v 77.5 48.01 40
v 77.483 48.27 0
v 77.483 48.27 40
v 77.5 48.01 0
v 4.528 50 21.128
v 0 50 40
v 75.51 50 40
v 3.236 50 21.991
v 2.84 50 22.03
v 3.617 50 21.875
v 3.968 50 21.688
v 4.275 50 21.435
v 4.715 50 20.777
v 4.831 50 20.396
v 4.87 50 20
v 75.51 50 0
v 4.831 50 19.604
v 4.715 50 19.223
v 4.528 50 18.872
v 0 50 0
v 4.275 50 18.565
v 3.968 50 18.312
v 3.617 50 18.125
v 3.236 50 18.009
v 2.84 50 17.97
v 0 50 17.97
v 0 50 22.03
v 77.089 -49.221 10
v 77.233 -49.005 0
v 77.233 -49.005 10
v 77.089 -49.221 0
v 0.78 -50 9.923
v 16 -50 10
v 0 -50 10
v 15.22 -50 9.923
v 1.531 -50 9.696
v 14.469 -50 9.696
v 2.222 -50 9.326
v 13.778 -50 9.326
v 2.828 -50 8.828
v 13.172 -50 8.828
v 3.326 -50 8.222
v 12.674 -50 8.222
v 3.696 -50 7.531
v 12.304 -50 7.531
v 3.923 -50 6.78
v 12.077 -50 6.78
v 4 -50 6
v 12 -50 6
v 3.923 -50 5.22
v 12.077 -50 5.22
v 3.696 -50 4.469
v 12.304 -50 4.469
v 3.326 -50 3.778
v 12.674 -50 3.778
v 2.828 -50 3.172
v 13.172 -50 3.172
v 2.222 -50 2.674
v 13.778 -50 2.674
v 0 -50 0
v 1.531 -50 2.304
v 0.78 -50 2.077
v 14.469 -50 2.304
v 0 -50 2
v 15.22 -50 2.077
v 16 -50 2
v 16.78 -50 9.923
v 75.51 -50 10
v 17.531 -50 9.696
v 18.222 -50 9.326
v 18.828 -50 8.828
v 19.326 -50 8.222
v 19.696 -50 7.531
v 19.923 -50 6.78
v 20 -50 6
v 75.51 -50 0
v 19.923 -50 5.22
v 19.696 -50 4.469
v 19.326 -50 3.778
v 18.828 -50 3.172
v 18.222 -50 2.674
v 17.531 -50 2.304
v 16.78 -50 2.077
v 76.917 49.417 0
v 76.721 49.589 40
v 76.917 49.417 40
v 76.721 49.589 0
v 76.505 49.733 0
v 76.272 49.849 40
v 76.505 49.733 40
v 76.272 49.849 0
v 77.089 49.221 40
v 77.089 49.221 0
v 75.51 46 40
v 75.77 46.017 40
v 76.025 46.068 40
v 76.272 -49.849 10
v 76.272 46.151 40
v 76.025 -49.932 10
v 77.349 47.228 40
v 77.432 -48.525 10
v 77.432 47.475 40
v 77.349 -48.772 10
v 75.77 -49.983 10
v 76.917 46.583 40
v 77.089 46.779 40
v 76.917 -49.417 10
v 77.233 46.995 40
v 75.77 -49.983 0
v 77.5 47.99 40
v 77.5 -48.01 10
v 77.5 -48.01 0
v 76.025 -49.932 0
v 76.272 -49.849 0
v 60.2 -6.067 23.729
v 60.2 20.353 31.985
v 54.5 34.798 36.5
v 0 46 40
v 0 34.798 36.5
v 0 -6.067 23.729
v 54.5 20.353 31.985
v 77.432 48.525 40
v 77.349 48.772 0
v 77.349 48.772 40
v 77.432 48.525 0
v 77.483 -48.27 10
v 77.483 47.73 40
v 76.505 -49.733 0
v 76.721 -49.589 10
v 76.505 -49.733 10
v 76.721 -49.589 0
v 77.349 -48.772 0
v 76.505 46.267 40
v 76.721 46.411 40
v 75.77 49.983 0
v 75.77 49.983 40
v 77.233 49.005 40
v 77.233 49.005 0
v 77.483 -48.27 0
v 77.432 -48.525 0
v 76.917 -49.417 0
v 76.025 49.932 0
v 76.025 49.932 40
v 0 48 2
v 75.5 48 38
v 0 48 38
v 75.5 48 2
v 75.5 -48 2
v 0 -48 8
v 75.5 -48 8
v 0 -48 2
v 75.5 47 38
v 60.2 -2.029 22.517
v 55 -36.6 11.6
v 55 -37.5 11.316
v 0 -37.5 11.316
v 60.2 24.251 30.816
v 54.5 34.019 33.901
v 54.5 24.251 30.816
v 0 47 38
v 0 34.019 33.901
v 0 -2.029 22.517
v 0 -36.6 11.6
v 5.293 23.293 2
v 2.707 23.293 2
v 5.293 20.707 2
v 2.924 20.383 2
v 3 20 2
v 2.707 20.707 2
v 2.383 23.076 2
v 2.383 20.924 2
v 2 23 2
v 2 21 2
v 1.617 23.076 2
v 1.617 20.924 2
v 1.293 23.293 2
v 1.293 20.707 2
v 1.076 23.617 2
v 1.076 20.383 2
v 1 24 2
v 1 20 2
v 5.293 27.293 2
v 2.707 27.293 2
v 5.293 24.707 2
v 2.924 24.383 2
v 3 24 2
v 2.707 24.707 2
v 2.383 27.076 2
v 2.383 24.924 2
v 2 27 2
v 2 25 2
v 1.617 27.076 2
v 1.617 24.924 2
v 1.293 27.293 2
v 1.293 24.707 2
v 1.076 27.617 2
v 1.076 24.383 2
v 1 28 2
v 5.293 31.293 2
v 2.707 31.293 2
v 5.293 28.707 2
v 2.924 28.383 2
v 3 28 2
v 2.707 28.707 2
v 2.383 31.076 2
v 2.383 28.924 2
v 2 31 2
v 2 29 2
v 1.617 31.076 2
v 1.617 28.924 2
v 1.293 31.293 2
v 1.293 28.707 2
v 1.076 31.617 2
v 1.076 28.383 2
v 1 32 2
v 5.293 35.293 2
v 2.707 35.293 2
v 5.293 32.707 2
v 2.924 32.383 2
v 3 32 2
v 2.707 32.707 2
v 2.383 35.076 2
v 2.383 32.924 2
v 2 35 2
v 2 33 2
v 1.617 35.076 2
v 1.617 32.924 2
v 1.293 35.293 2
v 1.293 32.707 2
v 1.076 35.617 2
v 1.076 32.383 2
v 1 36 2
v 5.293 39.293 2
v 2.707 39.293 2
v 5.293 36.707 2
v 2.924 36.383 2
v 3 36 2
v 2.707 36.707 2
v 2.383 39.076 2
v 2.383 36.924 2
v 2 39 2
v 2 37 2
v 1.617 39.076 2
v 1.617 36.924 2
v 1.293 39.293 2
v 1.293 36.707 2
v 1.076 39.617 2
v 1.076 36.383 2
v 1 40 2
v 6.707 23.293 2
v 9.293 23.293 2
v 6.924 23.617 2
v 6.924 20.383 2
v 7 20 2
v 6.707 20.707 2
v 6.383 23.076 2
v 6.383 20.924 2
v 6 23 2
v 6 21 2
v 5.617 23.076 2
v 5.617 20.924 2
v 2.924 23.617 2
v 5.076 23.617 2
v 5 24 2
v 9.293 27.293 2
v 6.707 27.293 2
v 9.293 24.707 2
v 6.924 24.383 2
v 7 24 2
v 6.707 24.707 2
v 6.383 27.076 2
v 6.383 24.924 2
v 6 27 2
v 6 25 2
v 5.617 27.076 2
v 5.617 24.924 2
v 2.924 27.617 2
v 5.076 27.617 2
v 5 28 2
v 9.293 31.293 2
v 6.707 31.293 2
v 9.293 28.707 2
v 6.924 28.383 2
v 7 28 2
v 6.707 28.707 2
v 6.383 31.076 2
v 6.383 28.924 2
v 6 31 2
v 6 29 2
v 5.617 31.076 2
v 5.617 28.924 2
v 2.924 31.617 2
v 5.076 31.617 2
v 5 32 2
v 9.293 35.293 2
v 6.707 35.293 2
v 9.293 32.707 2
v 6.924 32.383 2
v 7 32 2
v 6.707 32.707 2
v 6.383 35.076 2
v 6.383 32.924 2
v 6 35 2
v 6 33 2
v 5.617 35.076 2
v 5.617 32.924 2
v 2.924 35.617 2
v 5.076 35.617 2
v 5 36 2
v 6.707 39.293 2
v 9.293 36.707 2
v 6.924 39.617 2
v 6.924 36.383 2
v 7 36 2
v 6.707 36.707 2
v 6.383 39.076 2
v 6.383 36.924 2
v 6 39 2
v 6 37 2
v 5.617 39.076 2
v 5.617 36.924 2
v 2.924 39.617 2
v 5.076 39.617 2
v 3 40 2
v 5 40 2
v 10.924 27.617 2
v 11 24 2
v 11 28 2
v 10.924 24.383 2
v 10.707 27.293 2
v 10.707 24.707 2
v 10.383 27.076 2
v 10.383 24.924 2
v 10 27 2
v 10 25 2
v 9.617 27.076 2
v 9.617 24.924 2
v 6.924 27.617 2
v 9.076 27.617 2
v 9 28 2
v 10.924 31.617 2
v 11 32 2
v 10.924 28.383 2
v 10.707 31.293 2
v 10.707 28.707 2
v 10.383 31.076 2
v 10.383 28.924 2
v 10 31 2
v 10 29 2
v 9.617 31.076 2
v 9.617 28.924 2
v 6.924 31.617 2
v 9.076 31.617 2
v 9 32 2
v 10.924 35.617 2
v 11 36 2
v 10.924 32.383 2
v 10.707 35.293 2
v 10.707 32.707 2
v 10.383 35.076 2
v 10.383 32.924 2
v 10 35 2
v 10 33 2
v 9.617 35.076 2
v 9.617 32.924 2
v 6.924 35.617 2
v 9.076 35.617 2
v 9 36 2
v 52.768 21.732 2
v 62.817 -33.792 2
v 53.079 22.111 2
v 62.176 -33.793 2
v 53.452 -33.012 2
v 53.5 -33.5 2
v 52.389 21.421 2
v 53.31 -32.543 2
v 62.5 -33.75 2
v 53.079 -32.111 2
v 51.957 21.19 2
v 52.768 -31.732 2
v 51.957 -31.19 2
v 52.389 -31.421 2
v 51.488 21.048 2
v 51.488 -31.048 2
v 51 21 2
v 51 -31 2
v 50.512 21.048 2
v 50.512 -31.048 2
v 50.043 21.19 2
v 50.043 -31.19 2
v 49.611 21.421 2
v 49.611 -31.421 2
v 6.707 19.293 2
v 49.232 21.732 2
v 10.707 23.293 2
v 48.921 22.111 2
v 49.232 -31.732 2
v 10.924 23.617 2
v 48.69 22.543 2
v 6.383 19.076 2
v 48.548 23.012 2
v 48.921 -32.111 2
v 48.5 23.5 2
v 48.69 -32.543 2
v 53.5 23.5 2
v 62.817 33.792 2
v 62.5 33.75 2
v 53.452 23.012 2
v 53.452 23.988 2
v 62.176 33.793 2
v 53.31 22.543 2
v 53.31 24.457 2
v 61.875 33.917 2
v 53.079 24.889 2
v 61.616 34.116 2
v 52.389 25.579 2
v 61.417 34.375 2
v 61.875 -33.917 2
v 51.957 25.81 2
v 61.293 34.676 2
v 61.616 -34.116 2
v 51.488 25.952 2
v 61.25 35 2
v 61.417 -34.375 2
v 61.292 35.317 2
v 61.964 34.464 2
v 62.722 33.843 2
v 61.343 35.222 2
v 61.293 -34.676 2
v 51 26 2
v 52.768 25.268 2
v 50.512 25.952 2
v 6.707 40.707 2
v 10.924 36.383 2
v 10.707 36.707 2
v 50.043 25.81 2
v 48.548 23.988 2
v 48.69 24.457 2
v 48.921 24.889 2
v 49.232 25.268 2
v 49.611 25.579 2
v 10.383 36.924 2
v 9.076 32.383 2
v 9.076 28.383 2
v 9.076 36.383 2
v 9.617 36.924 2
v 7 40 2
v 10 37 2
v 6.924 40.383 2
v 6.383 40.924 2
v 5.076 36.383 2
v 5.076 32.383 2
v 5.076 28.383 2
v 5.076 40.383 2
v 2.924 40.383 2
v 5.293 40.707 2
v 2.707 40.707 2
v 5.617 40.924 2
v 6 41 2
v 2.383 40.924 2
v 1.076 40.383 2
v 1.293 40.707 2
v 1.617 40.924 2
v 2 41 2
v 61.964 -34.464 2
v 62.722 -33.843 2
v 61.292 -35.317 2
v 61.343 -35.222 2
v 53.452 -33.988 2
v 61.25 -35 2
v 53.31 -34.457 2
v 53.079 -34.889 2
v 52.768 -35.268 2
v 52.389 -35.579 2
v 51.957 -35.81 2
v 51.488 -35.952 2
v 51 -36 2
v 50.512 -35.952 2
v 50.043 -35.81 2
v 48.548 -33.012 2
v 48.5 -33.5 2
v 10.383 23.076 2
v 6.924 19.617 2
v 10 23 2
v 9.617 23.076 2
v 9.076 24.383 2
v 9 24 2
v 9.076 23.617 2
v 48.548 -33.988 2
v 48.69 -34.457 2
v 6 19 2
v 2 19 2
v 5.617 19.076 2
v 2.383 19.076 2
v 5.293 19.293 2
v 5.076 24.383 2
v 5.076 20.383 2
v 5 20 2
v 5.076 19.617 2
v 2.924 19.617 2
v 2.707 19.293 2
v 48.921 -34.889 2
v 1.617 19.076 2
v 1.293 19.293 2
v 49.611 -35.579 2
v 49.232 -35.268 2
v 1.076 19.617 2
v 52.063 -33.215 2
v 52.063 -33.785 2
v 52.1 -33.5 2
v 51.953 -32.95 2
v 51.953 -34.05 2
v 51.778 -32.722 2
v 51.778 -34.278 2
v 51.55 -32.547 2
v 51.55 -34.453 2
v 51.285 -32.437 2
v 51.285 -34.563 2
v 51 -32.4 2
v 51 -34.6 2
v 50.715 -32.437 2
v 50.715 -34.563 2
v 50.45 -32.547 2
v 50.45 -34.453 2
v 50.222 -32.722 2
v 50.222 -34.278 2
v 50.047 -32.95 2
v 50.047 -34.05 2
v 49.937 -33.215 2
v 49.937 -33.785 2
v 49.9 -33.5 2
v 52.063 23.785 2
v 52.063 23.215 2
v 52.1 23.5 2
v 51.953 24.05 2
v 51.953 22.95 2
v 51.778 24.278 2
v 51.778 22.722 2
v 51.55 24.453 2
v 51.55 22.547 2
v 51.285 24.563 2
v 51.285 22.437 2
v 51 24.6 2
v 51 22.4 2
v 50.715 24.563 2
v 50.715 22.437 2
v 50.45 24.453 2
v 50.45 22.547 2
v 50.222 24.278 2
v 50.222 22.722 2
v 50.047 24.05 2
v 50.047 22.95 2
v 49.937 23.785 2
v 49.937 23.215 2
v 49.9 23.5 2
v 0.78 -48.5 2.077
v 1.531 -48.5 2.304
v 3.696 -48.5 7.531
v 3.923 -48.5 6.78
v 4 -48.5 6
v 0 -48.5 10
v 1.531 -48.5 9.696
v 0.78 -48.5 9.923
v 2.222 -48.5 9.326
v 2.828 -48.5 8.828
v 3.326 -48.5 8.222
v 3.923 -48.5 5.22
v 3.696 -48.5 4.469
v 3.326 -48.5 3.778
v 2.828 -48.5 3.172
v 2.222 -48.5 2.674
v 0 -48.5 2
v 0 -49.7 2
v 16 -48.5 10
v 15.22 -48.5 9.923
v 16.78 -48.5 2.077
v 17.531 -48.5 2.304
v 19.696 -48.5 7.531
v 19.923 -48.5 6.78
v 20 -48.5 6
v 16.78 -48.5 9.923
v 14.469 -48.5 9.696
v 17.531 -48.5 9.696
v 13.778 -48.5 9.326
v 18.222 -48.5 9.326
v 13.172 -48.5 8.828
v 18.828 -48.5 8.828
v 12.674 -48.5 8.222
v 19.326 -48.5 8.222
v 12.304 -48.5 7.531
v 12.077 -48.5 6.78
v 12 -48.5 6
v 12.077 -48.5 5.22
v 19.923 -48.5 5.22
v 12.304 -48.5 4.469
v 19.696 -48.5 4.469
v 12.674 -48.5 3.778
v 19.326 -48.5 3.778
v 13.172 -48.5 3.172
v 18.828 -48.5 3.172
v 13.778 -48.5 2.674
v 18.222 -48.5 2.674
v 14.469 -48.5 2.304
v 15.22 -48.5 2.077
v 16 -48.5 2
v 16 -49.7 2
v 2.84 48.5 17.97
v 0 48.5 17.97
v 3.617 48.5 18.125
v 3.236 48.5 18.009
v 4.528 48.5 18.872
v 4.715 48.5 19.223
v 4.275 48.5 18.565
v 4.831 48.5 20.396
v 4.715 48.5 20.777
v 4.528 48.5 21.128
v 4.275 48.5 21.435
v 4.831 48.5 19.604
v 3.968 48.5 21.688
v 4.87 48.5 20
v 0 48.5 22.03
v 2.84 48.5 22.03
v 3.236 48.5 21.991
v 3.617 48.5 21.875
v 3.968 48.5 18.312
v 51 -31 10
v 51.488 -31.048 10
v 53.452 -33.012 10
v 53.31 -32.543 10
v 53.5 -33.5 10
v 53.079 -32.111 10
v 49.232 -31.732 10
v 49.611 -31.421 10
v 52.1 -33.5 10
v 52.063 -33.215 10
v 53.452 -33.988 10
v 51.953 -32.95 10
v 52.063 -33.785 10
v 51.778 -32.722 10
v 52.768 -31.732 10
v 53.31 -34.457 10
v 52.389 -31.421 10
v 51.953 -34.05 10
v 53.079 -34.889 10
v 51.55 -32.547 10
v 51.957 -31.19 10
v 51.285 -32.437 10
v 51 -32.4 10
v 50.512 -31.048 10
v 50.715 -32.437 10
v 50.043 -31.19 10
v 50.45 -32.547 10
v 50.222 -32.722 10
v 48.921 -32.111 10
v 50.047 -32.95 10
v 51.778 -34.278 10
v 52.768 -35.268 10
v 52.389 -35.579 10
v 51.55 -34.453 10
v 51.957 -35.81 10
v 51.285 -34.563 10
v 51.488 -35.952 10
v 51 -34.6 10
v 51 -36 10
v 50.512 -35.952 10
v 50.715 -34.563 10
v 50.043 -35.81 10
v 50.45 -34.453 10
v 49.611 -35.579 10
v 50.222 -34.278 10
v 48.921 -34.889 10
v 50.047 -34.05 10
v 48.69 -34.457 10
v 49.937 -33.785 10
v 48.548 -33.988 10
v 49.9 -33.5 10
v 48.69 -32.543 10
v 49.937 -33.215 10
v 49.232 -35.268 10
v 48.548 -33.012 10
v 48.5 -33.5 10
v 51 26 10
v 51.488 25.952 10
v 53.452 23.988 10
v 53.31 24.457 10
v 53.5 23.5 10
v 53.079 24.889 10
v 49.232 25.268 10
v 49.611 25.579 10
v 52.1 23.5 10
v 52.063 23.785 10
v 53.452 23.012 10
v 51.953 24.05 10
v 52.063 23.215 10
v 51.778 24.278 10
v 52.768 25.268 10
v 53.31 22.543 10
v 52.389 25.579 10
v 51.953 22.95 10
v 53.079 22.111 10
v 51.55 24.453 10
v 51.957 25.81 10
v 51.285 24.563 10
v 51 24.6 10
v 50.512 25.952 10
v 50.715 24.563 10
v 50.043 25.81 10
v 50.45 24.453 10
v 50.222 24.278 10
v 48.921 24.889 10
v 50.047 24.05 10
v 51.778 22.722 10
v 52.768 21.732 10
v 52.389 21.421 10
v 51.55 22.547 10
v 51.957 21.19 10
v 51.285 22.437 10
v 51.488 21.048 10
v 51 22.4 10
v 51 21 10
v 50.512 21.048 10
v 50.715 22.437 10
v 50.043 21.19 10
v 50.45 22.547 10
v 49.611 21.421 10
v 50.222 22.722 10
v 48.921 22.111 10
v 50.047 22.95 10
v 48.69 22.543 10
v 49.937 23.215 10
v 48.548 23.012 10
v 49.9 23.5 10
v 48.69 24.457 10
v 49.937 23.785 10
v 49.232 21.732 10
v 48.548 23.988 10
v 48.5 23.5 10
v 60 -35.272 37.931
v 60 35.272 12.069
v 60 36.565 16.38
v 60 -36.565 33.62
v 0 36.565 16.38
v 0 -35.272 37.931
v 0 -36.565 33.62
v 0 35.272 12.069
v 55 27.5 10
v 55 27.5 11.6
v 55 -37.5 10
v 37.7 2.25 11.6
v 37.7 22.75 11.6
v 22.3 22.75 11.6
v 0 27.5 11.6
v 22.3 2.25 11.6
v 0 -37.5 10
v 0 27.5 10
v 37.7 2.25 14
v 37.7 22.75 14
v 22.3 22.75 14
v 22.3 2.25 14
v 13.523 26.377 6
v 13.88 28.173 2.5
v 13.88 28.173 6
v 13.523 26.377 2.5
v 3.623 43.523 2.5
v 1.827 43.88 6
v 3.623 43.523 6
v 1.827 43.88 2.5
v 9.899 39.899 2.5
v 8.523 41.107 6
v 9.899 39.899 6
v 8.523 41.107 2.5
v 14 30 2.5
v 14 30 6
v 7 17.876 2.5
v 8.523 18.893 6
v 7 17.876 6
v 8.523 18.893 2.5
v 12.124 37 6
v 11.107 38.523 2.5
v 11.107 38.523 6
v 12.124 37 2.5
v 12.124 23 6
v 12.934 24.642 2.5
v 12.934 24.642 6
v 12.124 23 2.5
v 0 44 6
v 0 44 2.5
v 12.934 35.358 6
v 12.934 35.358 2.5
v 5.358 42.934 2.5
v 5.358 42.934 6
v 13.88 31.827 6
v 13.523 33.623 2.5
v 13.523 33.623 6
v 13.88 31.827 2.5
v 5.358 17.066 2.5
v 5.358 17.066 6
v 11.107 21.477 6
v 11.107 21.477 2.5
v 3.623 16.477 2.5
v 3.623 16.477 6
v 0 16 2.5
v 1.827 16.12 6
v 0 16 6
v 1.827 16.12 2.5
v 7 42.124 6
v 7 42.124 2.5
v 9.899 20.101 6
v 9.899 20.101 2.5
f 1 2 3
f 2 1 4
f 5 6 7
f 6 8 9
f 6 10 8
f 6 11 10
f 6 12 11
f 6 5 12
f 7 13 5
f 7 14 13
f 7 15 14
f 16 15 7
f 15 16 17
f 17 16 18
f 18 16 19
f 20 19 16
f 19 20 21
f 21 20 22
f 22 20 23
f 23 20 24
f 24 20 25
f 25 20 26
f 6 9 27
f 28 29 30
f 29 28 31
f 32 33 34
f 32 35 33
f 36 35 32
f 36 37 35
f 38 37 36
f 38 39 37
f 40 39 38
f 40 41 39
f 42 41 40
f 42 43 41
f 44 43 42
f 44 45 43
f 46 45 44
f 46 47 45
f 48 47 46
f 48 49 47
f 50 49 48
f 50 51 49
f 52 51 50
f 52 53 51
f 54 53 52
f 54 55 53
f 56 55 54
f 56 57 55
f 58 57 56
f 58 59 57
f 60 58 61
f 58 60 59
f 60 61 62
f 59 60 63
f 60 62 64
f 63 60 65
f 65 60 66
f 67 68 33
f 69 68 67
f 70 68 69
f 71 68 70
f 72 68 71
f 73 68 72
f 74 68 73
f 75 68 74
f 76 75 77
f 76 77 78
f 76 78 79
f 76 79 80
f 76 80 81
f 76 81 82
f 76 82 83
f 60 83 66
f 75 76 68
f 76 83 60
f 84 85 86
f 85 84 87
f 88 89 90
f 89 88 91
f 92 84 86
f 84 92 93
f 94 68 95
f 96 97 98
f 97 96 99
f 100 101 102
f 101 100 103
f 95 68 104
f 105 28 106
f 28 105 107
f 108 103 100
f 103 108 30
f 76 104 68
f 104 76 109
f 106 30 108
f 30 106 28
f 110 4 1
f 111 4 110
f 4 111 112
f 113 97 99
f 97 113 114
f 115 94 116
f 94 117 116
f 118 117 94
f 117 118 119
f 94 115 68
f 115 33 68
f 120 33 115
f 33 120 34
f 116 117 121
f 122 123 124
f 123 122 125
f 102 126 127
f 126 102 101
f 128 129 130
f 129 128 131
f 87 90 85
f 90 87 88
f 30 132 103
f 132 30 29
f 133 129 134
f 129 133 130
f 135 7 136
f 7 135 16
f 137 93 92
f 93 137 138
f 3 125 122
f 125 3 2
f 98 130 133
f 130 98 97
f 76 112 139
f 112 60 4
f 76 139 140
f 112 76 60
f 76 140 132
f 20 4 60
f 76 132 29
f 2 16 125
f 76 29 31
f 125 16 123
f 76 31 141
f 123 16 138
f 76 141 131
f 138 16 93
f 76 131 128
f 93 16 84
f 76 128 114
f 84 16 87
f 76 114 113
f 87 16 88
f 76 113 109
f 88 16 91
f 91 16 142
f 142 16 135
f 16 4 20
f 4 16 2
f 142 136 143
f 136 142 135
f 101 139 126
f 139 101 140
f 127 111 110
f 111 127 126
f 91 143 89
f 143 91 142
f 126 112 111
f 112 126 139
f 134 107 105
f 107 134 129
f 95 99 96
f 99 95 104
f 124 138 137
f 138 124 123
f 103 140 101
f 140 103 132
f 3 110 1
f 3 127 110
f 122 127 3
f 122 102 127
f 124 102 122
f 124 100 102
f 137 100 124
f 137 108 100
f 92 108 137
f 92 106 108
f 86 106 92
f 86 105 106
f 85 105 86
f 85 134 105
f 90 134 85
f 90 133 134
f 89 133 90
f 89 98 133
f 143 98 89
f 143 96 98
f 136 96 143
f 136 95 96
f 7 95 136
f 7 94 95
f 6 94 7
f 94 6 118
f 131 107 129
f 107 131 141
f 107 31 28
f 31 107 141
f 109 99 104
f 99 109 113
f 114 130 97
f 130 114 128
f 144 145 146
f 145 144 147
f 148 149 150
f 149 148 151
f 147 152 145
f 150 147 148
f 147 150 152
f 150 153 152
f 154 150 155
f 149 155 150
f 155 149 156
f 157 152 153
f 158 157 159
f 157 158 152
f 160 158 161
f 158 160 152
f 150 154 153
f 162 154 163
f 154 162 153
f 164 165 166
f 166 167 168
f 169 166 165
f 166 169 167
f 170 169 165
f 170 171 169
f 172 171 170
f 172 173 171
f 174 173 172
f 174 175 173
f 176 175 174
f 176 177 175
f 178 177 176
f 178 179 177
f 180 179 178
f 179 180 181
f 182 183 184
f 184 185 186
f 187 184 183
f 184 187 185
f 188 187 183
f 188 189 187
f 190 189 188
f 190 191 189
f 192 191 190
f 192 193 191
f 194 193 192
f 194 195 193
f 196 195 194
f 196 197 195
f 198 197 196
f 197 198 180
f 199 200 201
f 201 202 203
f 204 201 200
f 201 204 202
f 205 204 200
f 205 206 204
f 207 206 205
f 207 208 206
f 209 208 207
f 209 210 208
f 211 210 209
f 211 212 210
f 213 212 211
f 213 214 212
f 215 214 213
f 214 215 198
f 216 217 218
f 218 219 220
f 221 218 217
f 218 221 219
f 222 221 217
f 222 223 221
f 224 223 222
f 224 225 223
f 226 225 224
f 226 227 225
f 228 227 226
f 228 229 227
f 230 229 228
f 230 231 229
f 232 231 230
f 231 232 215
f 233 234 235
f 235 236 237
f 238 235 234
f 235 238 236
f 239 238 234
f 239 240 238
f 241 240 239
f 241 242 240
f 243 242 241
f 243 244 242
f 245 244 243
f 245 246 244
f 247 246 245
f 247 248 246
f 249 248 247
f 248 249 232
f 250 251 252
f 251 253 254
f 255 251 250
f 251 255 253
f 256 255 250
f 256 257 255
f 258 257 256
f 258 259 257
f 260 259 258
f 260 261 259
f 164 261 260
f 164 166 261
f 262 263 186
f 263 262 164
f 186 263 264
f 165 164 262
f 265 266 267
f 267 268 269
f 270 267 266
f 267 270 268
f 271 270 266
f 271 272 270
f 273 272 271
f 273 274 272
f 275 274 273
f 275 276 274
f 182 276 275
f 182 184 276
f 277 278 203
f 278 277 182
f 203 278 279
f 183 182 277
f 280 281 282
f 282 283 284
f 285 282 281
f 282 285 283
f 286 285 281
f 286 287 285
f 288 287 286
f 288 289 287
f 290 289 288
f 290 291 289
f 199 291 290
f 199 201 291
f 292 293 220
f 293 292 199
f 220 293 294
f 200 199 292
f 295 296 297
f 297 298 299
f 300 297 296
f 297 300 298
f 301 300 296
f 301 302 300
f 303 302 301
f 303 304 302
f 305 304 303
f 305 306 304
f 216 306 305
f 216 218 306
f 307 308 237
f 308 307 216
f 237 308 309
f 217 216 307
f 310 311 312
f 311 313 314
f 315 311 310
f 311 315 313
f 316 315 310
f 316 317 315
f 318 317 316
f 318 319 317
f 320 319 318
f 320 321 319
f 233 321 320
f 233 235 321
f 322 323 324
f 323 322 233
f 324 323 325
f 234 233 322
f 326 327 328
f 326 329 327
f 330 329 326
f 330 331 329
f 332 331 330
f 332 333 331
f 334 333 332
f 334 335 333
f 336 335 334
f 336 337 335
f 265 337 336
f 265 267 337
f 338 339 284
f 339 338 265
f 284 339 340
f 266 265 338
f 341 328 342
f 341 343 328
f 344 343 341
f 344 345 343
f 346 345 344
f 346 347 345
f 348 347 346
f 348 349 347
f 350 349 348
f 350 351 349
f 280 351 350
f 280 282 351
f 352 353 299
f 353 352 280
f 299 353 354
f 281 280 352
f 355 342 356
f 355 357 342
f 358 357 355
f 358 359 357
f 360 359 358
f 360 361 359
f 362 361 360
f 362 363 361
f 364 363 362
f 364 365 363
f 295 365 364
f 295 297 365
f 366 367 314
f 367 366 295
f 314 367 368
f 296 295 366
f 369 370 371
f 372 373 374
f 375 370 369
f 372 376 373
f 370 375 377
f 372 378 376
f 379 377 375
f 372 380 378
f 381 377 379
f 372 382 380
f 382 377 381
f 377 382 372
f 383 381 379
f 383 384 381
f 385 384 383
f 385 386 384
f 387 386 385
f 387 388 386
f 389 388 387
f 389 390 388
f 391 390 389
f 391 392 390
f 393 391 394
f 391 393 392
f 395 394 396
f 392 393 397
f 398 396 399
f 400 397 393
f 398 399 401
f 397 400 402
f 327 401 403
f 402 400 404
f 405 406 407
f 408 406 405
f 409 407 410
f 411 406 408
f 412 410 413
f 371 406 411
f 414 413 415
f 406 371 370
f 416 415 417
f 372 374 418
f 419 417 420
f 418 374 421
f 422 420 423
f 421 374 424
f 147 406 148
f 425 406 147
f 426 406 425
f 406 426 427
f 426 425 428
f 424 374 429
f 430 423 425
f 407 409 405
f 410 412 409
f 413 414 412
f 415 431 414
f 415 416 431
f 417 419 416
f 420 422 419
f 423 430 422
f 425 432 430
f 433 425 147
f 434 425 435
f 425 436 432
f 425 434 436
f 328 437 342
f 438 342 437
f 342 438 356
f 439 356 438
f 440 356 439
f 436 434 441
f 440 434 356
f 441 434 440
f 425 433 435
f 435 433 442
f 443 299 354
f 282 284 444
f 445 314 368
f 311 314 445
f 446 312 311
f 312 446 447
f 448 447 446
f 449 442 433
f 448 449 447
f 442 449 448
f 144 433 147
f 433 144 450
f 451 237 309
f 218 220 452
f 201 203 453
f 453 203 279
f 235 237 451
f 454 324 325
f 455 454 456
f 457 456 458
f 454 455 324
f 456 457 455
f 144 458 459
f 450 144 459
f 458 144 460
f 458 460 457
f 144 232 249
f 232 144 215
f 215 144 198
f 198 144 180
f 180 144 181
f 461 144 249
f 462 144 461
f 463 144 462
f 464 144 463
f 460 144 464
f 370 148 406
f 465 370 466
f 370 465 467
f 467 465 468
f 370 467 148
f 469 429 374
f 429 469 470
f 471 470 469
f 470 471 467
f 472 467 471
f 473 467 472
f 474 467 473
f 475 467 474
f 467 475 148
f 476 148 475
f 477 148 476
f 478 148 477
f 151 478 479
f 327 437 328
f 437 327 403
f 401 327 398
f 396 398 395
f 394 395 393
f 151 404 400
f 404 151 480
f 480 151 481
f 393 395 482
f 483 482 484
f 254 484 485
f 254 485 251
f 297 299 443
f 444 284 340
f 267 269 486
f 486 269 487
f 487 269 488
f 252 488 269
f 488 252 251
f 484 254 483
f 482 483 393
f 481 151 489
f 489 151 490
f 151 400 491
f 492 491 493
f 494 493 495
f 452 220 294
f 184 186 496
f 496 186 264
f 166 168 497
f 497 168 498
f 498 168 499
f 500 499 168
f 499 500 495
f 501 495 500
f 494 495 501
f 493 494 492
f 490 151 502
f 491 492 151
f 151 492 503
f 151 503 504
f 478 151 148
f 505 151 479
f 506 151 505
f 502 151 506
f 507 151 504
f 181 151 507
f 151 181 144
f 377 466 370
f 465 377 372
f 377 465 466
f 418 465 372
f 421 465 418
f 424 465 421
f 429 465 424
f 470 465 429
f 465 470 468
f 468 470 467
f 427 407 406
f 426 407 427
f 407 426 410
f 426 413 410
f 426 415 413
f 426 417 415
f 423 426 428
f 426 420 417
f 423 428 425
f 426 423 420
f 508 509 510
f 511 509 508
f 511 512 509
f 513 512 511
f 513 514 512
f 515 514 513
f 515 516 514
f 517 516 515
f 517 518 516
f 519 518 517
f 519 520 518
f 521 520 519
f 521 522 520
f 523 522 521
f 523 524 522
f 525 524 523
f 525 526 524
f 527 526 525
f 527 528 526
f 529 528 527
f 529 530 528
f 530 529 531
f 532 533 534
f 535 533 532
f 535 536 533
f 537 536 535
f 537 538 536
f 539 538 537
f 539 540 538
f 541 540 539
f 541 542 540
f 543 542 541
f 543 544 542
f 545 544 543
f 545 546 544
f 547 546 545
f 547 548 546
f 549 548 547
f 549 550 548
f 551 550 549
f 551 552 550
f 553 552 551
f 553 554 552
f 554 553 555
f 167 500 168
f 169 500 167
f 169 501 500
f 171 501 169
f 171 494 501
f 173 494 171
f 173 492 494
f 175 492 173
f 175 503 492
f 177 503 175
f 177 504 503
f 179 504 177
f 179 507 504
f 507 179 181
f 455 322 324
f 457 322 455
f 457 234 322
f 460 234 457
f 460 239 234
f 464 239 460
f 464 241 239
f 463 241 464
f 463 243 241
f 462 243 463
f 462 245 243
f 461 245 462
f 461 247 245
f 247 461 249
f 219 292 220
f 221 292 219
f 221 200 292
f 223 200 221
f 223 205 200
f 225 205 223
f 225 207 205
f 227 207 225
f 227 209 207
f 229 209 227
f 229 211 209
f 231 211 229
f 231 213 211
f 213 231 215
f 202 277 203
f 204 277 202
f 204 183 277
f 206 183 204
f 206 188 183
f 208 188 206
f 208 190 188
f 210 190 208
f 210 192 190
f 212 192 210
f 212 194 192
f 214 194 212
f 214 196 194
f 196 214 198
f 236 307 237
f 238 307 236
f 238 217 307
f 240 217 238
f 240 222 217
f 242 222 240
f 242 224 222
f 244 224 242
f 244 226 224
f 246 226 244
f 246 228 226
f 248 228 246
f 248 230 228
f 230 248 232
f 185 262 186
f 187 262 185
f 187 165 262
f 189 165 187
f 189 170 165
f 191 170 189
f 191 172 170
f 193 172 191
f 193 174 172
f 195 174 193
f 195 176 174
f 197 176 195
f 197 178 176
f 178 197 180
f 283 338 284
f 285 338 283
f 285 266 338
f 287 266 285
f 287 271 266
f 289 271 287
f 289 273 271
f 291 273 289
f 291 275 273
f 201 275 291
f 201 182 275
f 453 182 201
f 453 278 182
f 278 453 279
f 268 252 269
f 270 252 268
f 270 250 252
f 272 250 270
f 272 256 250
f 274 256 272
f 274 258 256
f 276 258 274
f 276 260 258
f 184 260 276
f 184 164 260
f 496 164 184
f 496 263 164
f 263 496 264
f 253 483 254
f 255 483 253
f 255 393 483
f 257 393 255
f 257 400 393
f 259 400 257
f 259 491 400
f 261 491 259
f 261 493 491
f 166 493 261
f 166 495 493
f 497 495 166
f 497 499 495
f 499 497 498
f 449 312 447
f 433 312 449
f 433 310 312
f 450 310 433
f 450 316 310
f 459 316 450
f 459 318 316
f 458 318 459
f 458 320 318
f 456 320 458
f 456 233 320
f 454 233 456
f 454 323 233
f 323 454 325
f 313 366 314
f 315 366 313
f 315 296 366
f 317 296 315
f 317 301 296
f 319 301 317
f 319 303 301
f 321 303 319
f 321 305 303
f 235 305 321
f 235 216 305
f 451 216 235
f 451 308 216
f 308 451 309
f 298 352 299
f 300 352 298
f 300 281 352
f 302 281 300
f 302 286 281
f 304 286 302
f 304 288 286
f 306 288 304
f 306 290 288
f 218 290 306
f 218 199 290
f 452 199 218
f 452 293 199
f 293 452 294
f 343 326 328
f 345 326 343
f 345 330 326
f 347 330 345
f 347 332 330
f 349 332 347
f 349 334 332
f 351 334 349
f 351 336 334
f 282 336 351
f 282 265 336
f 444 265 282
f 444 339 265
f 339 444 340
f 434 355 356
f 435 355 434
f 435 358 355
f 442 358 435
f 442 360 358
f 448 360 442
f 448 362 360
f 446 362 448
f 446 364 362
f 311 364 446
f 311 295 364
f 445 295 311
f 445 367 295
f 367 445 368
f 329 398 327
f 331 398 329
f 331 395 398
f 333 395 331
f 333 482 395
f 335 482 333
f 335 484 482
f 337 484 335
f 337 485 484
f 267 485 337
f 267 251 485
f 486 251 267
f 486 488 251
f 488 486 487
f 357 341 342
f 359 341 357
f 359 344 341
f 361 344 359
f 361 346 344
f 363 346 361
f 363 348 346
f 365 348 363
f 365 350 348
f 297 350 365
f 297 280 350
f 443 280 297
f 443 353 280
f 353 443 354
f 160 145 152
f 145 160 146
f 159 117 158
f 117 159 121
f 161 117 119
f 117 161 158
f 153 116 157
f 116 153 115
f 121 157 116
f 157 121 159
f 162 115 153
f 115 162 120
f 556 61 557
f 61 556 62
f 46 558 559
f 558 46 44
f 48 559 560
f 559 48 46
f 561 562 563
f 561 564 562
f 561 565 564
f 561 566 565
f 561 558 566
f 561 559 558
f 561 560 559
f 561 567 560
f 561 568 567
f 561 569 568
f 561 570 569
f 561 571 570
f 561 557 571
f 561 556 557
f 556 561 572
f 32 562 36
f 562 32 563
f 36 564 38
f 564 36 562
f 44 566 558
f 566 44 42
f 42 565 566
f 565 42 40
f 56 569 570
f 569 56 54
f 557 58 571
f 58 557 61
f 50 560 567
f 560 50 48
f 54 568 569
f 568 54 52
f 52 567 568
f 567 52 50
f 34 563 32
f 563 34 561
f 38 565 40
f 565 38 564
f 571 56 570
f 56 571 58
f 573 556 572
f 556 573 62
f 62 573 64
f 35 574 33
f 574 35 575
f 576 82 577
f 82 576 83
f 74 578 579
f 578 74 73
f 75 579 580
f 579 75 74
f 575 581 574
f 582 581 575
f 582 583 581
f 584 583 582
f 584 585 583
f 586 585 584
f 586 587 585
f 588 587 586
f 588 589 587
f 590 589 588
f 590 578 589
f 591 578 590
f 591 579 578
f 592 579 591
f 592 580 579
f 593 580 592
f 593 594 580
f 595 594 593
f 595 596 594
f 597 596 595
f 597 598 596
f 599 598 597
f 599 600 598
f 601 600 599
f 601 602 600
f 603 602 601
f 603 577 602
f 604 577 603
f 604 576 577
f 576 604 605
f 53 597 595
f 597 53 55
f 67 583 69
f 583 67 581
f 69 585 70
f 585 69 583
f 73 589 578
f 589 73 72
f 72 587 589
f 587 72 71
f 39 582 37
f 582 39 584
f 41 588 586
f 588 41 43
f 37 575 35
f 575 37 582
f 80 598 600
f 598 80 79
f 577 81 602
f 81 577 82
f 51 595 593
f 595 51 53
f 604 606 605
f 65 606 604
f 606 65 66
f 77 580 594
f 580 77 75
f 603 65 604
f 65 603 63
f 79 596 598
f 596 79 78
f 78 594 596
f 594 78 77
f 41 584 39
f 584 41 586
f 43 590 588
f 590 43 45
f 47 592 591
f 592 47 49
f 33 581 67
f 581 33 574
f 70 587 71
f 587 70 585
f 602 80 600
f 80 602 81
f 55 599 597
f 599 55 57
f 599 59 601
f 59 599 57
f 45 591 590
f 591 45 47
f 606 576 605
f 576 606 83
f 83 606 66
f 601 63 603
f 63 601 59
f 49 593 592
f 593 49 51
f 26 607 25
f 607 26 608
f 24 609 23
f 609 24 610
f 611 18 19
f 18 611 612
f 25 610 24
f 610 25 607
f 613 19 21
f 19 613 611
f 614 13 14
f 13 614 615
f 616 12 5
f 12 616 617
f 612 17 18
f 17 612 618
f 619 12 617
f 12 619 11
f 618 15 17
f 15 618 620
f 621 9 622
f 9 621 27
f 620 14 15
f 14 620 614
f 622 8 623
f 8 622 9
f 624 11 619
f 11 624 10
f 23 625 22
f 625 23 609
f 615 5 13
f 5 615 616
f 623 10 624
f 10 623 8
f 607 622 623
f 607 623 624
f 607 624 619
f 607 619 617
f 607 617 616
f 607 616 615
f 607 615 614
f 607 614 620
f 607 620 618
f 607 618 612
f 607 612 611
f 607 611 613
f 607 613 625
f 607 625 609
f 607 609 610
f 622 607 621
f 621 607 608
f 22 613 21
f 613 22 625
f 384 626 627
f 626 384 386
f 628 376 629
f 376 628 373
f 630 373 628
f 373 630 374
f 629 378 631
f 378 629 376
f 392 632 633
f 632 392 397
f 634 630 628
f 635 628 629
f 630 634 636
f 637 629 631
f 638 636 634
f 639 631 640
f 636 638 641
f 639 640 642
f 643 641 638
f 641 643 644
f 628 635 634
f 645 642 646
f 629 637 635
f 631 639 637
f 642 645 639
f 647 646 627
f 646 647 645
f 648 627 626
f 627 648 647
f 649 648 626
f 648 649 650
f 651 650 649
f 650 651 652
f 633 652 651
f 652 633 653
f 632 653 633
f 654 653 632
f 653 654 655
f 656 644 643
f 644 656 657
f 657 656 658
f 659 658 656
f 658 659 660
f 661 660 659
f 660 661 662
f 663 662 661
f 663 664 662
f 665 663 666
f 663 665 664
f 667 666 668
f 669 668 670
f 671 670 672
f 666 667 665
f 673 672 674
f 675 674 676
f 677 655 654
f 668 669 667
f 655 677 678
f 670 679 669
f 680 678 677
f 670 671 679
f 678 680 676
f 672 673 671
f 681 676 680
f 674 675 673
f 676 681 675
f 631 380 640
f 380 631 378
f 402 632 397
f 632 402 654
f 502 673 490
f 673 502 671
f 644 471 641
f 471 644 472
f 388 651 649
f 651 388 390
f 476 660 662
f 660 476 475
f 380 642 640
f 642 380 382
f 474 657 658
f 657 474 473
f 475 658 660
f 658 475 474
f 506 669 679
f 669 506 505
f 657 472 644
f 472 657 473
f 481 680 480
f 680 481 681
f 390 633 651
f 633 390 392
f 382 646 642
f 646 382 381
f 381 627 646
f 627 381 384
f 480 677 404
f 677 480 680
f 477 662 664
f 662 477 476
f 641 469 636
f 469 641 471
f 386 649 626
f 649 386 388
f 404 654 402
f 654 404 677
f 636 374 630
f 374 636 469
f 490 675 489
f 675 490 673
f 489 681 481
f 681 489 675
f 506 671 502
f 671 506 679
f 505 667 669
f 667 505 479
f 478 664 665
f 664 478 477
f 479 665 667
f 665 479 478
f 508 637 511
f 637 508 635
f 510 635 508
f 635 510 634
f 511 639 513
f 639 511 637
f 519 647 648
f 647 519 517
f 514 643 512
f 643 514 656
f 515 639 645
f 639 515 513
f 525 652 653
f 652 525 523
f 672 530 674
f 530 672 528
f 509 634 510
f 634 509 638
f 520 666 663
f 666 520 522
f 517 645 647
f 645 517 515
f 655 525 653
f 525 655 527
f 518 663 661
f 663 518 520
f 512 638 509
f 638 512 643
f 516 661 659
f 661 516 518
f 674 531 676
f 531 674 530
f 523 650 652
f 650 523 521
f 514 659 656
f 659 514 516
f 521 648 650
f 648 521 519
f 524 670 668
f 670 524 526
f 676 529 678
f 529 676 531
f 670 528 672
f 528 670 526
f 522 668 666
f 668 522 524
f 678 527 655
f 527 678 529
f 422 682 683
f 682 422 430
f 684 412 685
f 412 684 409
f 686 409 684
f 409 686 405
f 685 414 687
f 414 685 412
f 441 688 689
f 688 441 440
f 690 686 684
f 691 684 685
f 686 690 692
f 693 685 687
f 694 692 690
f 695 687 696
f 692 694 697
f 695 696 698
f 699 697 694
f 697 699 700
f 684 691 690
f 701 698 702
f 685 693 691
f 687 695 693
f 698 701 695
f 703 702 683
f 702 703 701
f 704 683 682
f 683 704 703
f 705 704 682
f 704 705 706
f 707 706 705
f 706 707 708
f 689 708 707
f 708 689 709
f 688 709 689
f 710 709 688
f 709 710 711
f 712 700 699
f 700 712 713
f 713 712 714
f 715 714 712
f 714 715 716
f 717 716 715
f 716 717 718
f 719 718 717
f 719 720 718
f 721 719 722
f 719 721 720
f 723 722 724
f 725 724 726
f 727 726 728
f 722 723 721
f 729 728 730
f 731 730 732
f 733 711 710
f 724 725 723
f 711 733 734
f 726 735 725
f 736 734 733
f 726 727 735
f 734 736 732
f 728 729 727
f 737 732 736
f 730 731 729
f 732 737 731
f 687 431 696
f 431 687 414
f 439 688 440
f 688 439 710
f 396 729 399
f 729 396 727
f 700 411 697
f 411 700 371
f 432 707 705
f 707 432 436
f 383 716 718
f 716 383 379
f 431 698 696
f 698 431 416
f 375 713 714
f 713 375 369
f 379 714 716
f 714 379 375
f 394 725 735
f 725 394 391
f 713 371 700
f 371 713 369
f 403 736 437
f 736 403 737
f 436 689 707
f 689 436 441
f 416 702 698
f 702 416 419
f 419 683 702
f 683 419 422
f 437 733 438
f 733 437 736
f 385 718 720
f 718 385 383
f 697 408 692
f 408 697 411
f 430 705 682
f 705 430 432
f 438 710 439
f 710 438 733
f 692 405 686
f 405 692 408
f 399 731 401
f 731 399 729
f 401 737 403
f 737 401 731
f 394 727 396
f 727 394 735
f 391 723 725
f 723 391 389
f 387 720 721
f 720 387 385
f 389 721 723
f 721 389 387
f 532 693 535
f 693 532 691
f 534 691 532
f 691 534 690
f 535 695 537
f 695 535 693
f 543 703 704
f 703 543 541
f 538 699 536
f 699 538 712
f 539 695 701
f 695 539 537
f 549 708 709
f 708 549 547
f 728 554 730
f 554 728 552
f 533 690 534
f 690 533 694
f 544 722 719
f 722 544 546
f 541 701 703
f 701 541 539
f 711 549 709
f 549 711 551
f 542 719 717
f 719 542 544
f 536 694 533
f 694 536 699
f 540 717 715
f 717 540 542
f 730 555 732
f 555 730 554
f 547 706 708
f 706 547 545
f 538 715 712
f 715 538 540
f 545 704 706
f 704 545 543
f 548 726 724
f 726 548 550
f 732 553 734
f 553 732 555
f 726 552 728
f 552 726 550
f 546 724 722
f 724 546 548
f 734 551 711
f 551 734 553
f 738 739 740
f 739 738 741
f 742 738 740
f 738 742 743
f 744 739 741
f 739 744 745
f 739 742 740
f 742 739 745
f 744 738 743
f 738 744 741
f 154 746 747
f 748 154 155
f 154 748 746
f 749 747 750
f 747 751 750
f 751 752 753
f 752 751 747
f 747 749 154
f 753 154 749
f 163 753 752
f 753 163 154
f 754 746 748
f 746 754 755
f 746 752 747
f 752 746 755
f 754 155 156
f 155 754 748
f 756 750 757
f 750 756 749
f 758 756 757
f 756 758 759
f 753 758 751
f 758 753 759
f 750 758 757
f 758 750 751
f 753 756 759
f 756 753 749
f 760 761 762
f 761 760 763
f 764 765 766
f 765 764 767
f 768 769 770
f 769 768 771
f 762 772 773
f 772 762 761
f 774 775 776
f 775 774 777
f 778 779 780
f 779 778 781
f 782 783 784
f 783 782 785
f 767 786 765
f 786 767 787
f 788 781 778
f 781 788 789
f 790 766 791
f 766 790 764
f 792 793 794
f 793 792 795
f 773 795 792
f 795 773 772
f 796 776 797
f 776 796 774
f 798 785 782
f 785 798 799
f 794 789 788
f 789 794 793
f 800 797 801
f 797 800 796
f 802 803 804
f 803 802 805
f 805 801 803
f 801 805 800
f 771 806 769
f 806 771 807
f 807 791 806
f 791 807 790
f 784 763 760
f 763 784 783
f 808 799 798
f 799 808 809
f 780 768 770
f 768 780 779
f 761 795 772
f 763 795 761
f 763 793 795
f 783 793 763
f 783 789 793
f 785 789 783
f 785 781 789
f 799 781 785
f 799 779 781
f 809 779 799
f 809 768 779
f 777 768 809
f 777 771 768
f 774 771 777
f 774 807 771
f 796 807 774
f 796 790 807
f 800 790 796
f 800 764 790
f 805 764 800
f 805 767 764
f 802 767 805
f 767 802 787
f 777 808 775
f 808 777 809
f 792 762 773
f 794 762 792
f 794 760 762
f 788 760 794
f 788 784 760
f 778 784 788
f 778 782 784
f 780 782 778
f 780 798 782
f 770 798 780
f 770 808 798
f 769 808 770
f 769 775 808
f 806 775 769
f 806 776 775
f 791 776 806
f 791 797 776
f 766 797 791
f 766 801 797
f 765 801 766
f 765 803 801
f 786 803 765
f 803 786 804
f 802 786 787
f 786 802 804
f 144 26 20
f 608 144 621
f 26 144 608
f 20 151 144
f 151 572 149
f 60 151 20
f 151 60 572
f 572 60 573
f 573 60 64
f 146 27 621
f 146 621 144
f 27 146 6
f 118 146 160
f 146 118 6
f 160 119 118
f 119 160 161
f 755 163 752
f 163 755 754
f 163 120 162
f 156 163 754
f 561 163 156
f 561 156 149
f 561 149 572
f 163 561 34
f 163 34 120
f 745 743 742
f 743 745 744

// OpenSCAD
intersection() {
	union() {
		color(alpha = 0.85, c = "LightSteelBlue") {
			difference() {
				difference() {
					difference() {
						difference() {
							difference() {
								difference() {
									difference() {
										difference() {
											hull() {
												translate(v = [0, -48.0, 5.0]) {
													hull() {
														translate(v = [-75.51, -0.010000000000000009, 0]) {
															cylinder($fn = 48, center = true, h = 10.0, r = 1.99);
														}
														translate(v = [-75.51, 0.010000000000000009, 0]) {
															cylinder($fn = 48, center = true, h = 10.0, r = 1.99);
														}
														translate(v = [75.51, -0.010000000000000009, 0]) {
															cylinder($fn = 48, center = true, h = 10.0, r = 1.99);
														}
														translate(v = [75.51, 0.010000000000000009, 0]) {
															cylinder($fn = 48, center = true, h = 10.0, r = 1.99);
														}
													}
												}
												translate(v = [0, 48.0, 20.0]) {
													hull() {
														translate(v = [-75.51, -0.010000000000000009, 0]) {
															cylinder($fn = 48, center = true, h = 40.0, r = 1.99);
														}
														translate(v = [-75.51, 0.010000000000000009, 0]) {
															cylinder($fn = 48, center = true, h = 40.0, r = 1.99);
														}
														translate(v = [75.51, -0.010000000000000009, 0]) {
															cylinder($fn = 48, center = true, h = 40.0, r = 1.99);
														}
														translate(v = [75.51, 0.010000000000000009, 0]) {
															cylinder($fn = 48, center = true, h = 40.0, r = 1.99);
														}
													}
												}
											}
											hull() {
												translate(v = [0, -47.5, 5.0]) {
													cube(center = true, size = [151.0, 1.0, 6.0]);
												}
												translate(v = [0, 47.5, 20.0]) {
													cube(center = true, size = [151.0, 1.0, 36.0]);
												}
											}
										}
										translate(v = [0, 0.0, 35.0]) {
											rotate(a = [-16.69924423399362, 0, 0]) {
												cube(center = true, size = [109.0, 65.8, 25]);
											}
										}
									}
									translate(v = [0, 0.0, 30.0]) {
										rotate(a = [-16.69924423399362, 0, 0]) {
											cube(center = true, size = [120.4, 75.4, 15.5]);
										}
									}
								}
								translate(v = [-16.0, -50.0, 6.0]) {
									rotate(a = [90, 0, 0]) {
										cylinder($fn = 32, center = true, d = 8.0, h = 3.0);
									}
								}
							}
							translate(v = [0.0, -50.0, 6.0]) {
								rotate(a = [90, 0, 0]) {
									cylinder($fn = 32, center = true, d = 8.0, h = 3.0);
								}
							}
						}
						translate(v = [16.0, -50.0, 6.0]) {
							rotate(a = [90, 0, 0]) {
								cylinder($fn = 32, center = true, d = 8.0, h = 3.0);
							}
						}
					}
					translate(v = [0, 50.0, 20.0]) {
						rotate(a = [90, 0, 0]) {
							linear_extrude(center = true, height = 3.0) {
								hull() {
									translate(v = [-2.84, 0]) {
										circle($fn = 32, r = 2.0300000000000002);
									}
									translate(v = [2.84, 0]) {
										circle($fn = 32, r = 2.0300000000000002);
									}
								}
							}
						}
					}
				}
				translate(v = [-65.5, -50.0, 4.0]) {
					rotate(a = [90, 0, 0]) {
						cylinder($fn = 16, center = true, d = 2.0, h = 3.0);
					}
				}
			}
		}
		color(alpha = 0.85, c = "SlateGray") {
			union() {
				difference() {
					difference() {
						difference() {
							difference() {
								difference() {
									translate(v = [0, 0, 1.0]) {
										hull() {
											translate(v = [-72.5, -45.0, 0]) {
												cylinder($fn = 48, center = true, h = 2.0, r = 4.7);
											}
											translate(v = [-72.5, 45.0, 0]) {
												cylinder($fn = 48, center = true, h = 2.0, r = 4.7);
											}
											translate(v = [72.5, -45.0, 0]) {
												cylinder($fn = 48, center = true, h = 2.0, r = 4.7);
											}
											translate(v = [72.5, 45.0, 0]) {
												cylinder($fn = 48, center = true, h = 2.0, r = 4.7);
											}
										}
									}
									translate(v = [0.0, 30.0, 0]) {
										union() {
											translate(v = [-6.0, -10.0, 0]) {
												cylinder($fn = 16, center = true, d = 2.0, h = 20);
											}
											translate(v = [-2.0, -10.0, 0]) {
												cylinder($fn = 16, center = true, d = 2.0, h = 20);
											}
											translate(v = [2.0, -10.0, 0]) {
												cylinder($fn = 16, center = true, d = 2.0, h = 20);
											}
											translate(v = [6.0, -10.0, 0]) {
												cylinder($fn = 16, center = true, d = 2.0, h = 20);
											}
											translate(v = [-10.0, -6.0, 0]) {
												cylinder($fn = 16, center = true, d = 2.0, h = 20);
											}
											translate(v = [-6.0, -6.0, 0]) {
												cylinder($fn = 16, center = true, d = 2.0, h = 20);
											}
											translate(v = [-2.0, -6.0, 0]) {
												cylinder($fn = 16, center = true, d = 2.0, h = 20);
											}
											translate(v = [2.0, -6.0, 0]) {
												cylinder($fn = 16, center = true, d = 2.0, h = 20);
											}
											translate(v = [6.0, -6.0, 0]) {
												cylinder($fn = 16, center = true, d = 2.0, h = 20);
											}
											translate(v = [10.0, -6.0, 0]) {
												cylinder($fn = 16, center = true, d = 2.0, h = 20);
											}
											translate(v = [-10.0, -2.0, 0]) {
												cylinder($fn = 16, center = true, d = 2.0, h = 20);
											}
											translate(v = [-6.0, -2.0, 0]) {
												cylinder($fn = 16, center = true, d = 2.0, h = 20);
											}
											translate(v = [-2.0, -2.0, 0]) {
												cylinder($fn = 16, center = true, d = 2.0, h = 20);
											}
											translate(v = [2.0, -2.0, 0]) {
												cylinder($fn = 16, center = true, d = 2.0, h = 20);
											}
											translate(v = [6.0, -2.0, 0]) {
												cylinder($fn = 16, center = true, d = 2.0, h = 20);
											}
											translate(v = [10.0, -2.0, 0]) {
												cylinder($fn = 16, center = true, d = 2.0, h = 20);
											}
											translate(v = [-10.0, 2.0, 0]) {
												cylinder($fn = 16, center = true, d = 2.0, h = 20);
											}
											translate(v = [-6.0, 2.0, 0]) {
												cylinder($fn = 16, center = true, d = 2.0, h = 20);
											}
											translate(v = [-2.0, 2.0, 0]) {
												cylinder($fn = 16, center = true, d = 2.0, h = 20);
											}
											translate(v = [2.0, 2.0, 0]) {
												cylinder($fn = 16, center = true, d = 2.0, h = 20);
											}
											translate(v = [6.0, 2.0, 0]) {
												cylinder($fn = 16, center = true, d = 2.0, h = 20);
											}
											translate(v = [10.0, 2.0, 0]) {
												cylinder($fn = 16, center = true, d = 2.0, h = 20);
											}
											translate(v = [-10.0, 6.0, 0]) {
												cylinder($fn = 16, center = true, d = 2.0, h = 20);
											}
											translate(v = [-6.0, 6.0, 0]) {
												cylinder($fn = 16, center = true, d = 2.0, h = 20);
											}
											translate(v = [-2.0, 6.0, 0]) {
												cylinder($fn = 16, center = true, d = 2.0, h = 20);
											}
											translate(v = [2.0, 6.0, 0]) {
												cylinder($fn = 16, center = true, d = 2.0, h = 20);
											}
											translate(v = [6.0, 6.0, 0]) {
												cylinder($fn = 16, center = true, d = 2.0, h = 20);
											}
											translate(v = [10.0, 6.0, 0]) {
												cylinder($fn = 16, center = true, d = 2.0, h = 20);
											}
											translate(v = [-6.0, 10.0, 0]) {
												cylinder($fn = 16, center = true, d = 2.0, h = 20);
											}
											translate(v = [-2.0, 10.0, 0]) {
												cylinder($fn = 16, center = true, d = 2.0, h = 20);
											}
											translate(v = [2.0, 10.0, 0]) {
												cylinder($fn = 16, center = true, d = 2.0, h = 20);
											}
											translate(v = [6.0, 10.0, 0]) {
												cylinder($fn = 16, center = true, d = 2.0, h = 20);
											}
										}
									}
								}
								translate(v = [-62.5, -35.0, -0.1]) {
									cylinder($fn = 24, d = 2.5, h = 2.2);
								}
							}
							translate(v = [62.5, -35.0, -0.1]) {
								cylinder($fn = 24, d = 2.5, h = 2.2);
							}
						}
						translate(v = [-62.5, 35.0, -0.1]) {
							cylinder($fn = 24, d = 2.5, h = 2.2);
						}
					}
					translate(v = [62.5, 35.0, -0.1]) {
						cylinder($fn = 24, d = 2.5, h = 2.2);
					}
				}
				translate(v = [0, -5, 2.0]) {
					union() {
						translate(v = [-51.0, -28.5, 0]) {
							difference() {
								cylinder($fn = 32, center = false, d = 5.0, h = 8.0);
								translate(v = [0, 0, -0.1]) {
									cylinder($fn = 24, center = false, d = 2.2, h = 8.2);
								}
							}
						}
						translate(v = [51.0, -28.5, 0]) {
							difference() {
								cylinder($fn = 32, center = false, d = 5.0, h = 8.0);
								translate(v = [0, 0, -0.1]) {
									cylinder($fn = 24, center = false, d = 2.2, h = 8.2);
								}
							}
						}
						translate(v = [-51.0, 28.5, 0]) {
							difference() {
								cylinder($fn = 32, center = false, d = 5.0, h = 8.0);
								translate(v = [0, 0, -0.1]) {
									cylinder($fn = 24, center = false, d = 2.2, h = 8.2);
								}
							}
						}
						translate(v = [51.0, 28.5, 0]) {
							difference() {
								cylinder($fn = 32, center = false, d = 5.0, h = 8.0);
								translate(v = [0, 0, -0.1]) {
									cylinder($fn = 24, center = false, d = 2.2, h = 8.2);
								}
							}
						}
					}
				}
				union() {
					translate(v = [-65.5, -38.0, 0]) {
						color(alpha = 0.8, c = "DimGray") {
							cylinder($fn = 32, center = false, d = 10.0, h = 2.0);
						}
					}
					translate(v = [65.5, -38.0, 0]) {
						color(alpha = 0.8, c = "DimGray") {
							cylinder($fn = 32, center = false, d = 10.0, h = 2.0);
						}
					}
					translate(v = [-65.5, 38.0, 0]) {
						color(alpha = 0.8, c = "DimGray") {
							cylinder($fn = 32, center = false, d = 10.0, h = 2.0);
						}
					}
					translate(v = [65.5, 38.0, 0]) {
						color(alpha = 0.8, c = "DimGray") {
							cylinder($fn = 32, center = false, d = 10.0, h = 2.0);
						}
					}
				}
			}
		}
		translate(v = [0, 0, 25.0]) {
			rotate(a = [-16.69924423399362, 0, 0]) {
				union() {
					color(alpha = 0.5, c = "DodgerBlue") {
						cube(center = true, size = [120.0, 75.0, 4.5]);
					}
					color(alpha = 0.7, c = "LightBlue") {
						translate(v = [0, 0, 1.75]) {
							cube(center = true, size = [108.0, 64.8, 1.0]);
						}
					}
				}
			}
		}
		translate(v = [0, -5, 10.8]) {
			union() {
				color(alpha = 0.5, c = "ForestGreen") {
					cube(center = true, size = [110.0, 65.0, 1.6]);
				}
				color(alpha = 0.6, c = "DarkGreen") {
					translate(v = [30.0, 17.5, 2.0]) {
						cube(center = true, size = [15.4, 20.5, 2.4]);
					}
				}
			}
		}
		translate(v = [0.0, 30.0, 4.25]) {
			color(alpha = 0.5, c = "Gold") {
				cylinder($fn = 48, center = true, d = 28.0, h = 3.5);
			}
		}
	}
	translate(v = [250.0, 0, 0]) {
		cube(center = true, size = [500, 1000, 1000]);
	}
}
